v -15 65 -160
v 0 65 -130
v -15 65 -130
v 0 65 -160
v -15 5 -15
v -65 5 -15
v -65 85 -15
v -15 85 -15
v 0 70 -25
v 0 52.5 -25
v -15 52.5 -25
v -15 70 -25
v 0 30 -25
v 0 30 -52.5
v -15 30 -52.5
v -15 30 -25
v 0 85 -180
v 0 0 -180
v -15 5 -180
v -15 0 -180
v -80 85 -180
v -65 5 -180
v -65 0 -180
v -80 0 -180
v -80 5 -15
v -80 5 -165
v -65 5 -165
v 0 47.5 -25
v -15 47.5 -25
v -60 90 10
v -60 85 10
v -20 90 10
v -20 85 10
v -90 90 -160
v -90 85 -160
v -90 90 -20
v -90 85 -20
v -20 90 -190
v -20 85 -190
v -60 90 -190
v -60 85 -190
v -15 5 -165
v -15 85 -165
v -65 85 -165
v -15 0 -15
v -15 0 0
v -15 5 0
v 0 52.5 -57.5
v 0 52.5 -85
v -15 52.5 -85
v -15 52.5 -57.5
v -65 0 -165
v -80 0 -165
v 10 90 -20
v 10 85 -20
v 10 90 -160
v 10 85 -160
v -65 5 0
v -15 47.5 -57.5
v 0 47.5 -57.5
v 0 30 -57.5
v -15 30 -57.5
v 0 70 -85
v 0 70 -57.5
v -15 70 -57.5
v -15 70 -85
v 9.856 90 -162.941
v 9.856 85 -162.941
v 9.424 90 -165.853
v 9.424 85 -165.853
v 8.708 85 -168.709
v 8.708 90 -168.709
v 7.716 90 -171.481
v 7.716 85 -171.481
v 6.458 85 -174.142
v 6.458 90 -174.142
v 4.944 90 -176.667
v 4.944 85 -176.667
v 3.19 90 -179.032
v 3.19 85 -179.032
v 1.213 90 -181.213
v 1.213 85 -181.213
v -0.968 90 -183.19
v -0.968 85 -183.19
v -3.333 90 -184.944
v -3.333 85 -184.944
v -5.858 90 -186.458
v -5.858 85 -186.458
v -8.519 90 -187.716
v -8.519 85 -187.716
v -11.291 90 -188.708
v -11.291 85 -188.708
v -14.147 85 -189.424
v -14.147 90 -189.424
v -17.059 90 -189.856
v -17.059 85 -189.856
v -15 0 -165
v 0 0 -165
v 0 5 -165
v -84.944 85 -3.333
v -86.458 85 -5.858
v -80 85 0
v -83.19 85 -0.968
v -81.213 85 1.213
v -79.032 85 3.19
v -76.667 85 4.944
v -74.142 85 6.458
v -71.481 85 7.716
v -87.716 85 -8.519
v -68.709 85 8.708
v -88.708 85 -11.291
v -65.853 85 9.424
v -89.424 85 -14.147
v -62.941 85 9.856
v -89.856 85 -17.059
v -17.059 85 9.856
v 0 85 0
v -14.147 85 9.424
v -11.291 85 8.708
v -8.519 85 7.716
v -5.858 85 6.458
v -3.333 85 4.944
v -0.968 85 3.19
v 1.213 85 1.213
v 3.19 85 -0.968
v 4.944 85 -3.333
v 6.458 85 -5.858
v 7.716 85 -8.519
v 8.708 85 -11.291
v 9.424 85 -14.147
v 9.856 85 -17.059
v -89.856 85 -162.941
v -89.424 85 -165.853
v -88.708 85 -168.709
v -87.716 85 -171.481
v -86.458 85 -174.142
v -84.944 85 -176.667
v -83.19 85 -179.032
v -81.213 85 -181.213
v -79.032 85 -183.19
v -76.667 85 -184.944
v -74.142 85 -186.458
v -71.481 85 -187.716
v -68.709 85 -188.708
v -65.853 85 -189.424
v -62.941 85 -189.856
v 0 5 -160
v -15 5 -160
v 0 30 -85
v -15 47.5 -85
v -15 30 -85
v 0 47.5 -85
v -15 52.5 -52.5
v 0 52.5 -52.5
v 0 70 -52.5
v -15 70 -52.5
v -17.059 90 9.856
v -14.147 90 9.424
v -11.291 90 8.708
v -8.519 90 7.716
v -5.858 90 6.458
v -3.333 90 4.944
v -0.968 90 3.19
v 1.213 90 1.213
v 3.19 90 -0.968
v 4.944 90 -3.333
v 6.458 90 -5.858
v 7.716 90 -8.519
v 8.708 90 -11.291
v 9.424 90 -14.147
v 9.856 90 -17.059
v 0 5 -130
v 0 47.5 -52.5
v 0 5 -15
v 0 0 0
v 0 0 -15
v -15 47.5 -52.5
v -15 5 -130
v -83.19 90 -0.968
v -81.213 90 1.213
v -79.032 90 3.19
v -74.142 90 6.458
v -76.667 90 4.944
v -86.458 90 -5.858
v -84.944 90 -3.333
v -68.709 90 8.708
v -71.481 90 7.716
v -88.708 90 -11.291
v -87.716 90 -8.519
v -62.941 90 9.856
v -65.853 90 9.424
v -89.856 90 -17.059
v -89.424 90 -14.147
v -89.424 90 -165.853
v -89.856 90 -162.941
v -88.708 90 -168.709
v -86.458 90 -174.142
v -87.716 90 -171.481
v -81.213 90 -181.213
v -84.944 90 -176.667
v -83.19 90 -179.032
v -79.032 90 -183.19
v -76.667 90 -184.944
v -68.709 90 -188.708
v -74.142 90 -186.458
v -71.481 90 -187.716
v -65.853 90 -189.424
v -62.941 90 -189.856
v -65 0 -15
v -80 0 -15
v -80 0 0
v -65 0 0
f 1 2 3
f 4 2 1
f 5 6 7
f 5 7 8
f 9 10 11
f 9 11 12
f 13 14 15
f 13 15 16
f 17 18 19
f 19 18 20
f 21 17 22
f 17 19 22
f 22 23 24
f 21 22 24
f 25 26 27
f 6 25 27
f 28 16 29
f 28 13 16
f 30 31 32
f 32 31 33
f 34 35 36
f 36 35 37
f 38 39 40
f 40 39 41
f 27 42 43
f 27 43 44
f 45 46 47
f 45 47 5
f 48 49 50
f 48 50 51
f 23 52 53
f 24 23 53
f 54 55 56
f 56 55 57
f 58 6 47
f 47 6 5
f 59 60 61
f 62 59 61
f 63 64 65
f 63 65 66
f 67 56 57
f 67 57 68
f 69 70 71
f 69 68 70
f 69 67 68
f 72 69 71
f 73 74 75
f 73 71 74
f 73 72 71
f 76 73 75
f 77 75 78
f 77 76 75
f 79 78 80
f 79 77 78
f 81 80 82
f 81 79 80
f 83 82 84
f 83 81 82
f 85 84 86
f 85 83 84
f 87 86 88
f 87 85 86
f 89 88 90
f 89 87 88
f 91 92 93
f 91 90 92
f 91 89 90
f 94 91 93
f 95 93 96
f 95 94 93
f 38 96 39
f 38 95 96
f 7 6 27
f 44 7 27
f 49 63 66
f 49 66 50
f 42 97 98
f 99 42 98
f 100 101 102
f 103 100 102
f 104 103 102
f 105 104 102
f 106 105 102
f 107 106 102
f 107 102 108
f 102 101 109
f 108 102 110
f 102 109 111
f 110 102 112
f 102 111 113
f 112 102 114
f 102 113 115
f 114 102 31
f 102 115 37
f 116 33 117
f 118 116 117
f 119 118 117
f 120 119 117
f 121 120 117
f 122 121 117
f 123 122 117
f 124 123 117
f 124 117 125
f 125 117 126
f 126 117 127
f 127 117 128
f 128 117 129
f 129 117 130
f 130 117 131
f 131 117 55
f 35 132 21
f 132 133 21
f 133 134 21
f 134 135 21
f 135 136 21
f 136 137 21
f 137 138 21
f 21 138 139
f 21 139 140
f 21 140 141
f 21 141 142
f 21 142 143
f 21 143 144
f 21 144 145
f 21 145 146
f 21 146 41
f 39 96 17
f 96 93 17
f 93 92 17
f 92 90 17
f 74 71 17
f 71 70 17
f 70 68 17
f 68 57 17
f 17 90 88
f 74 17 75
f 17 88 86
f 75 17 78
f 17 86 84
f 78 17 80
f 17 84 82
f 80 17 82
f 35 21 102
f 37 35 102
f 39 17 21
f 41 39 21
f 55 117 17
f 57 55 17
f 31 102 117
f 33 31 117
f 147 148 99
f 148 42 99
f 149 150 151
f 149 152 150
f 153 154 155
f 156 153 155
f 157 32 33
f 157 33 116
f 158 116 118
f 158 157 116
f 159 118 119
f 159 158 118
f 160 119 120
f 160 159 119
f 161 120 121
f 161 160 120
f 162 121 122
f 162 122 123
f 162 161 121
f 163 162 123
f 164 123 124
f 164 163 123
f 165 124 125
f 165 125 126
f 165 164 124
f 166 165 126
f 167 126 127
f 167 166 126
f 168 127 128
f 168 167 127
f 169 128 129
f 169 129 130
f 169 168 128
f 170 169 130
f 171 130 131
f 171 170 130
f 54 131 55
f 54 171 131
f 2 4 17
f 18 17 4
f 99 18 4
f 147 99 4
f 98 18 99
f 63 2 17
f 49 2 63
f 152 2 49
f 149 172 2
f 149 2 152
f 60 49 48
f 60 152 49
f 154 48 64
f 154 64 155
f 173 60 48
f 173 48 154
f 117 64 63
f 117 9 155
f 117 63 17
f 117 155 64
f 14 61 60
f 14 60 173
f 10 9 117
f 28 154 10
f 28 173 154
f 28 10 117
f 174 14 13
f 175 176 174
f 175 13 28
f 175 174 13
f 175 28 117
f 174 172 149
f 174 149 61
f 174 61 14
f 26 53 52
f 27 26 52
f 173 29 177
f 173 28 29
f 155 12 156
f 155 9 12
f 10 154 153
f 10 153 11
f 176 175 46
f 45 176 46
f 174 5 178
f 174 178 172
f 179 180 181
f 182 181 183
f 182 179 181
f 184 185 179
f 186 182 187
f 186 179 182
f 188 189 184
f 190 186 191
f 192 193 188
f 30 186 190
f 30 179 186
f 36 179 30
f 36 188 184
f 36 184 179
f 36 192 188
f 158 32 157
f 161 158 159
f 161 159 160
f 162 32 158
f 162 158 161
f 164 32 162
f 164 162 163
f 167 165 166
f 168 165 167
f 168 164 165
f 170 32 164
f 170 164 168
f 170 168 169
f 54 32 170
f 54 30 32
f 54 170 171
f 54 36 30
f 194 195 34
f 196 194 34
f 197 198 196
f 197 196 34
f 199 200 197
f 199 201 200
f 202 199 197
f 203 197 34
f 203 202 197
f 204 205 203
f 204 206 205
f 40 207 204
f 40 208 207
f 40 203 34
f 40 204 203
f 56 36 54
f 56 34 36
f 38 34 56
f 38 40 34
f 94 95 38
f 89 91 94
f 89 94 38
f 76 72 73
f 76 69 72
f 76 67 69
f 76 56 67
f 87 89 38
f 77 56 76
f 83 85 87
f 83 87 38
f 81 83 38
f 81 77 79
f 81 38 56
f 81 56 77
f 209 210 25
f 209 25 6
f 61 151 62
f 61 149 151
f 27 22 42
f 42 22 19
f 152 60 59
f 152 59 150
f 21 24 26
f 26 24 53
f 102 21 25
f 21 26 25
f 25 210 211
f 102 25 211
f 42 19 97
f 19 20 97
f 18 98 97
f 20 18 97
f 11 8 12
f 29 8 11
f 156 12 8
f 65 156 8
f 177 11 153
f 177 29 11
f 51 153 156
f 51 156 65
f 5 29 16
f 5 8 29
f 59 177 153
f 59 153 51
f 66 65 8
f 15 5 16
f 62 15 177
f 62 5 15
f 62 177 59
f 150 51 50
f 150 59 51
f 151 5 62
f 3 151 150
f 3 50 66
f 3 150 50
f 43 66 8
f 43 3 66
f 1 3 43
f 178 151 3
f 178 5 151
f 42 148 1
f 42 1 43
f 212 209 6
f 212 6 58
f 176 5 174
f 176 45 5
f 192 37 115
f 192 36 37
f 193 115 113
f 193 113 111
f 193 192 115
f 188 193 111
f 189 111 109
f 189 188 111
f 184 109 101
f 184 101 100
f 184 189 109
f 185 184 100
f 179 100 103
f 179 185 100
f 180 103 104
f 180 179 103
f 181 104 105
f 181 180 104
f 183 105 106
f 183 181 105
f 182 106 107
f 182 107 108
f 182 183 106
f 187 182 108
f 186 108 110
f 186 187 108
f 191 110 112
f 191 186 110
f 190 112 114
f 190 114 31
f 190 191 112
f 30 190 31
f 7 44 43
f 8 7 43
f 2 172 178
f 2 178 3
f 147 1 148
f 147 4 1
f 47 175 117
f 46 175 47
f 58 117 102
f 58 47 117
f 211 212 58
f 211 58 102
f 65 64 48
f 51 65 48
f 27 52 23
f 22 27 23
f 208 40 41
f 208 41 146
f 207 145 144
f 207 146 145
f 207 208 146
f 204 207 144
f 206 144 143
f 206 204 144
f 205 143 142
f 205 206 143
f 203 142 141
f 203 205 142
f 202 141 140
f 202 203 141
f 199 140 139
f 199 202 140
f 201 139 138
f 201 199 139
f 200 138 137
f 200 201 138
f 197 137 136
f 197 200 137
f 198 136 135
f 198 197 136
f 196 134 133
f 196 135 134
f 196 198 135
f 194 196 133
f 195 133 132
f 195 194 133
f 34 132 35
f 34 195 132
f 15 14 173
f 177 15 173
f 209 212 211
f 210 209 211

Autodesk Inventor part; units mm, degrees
ref_plane "YZ Plane" through (0, 0, 0) normal (1, 0, 0) x (0, 1, 0)
ref_plane "XZ Plane" through (0, 0, 0) normal (0, 1, 0) x (-1, 0, 0)
ref_plane "XY Plane" through (0, 0, 0) normal (0, 0, 1) x (1, 0, 0)
sketch "Sketch1" plane through (0, 0, 0) normal (0, 1, 0) x (-1, 0, 0)
  line L0 (0, 0) -> (15, 0)
  line L1 (15, 0) -> (15, -15)
  line L2 (15, -15) -> (0, -15)
  line L3 (0, -15) -> (0, 0)
  line L4 (15, -165) -> (0, -165)
  line L5 (0, -165) -> (0, -180)
  line L6 (0, -180) -> (15, -180)
  line L7 (15, -180) -> (15, -165)
  line L8 (65, -180) -> (80, -180)
  line L9 (80, -180) -> (80, -165)
  line L10 (80, -165) -> (65, -165)
  line L11 (65, -165) -> (65, -180)
  line L12 (80, -15) -> (65, -15)
  line L13 (65, -15) -> (65, 0)
  line L14 (65, 0) -> (80, 0)
  line L15 (80, 0) -> (80, -15)
  point P0 (15, -7.5)
  dimension "d0" = 15
  dimension "d1" = 15
  dimension "d2" = 15
  dimension "d3" = 15
  dimension "d4" = 15
  dimension "d5" = 15
  dimension "d6" = 150
  dimension "d7" = 50
extrude "Extrusion1" add sketch "Sketch1" along normal blind 5
sketch "Sketch2" plane through (0, 5, 0) normal (0, 1, 0) x (1, 0, 0)
  line L0 (-80, 0) -> (-65, 0) projected
  line L1 (-80, 0) -> (-65, 0)
  line L2 (-65, 0) -> (-65, 180)
  line L3 (-65, 180) -> (-80, 180)
  line L4 (-80, 180) -> (-80, 0)
  line L5 (-15, 165) -> (0, 165) projected
  line L6 (-65, 180) -> (0, 180)
  line L7 (0, 180) -> (0, 165)
  line L8 (0, 165) -> (-65, 165)
  line L9 (-65, 165) -> (-65, 180)
  line L10 (-15, 0) -> (0, 0) projected
  line L11 (-15, 165) -> (0, 165)
  line L12 (0, 165) -> (0, 0)
  line L13 (0, 0) -> (-15, 0)
  line L14 (-15, 0) -> (-15, 165)
  line L15 (-15, 0) -> (-65, 0)
  line L16 (-65, 0) -> (-65, 15)
  line L17 (-65, 15) -> (-15, 15)
  line L18 (-15, 15) -> (-15, 0)
  point P0 (-65, 165)
extrude "Extrusion2" add sketch "Sketch2" along normal blind 80 contours L4 L3 L2 L0 | L2 L17 L14 L15 | L14 L5 L12 L10 | L6 L7 L5 L8 L2
sketch "Sketch3" plane through (0, 85, 0) normal (0, 1, 0) x (1, 0, 0)
  line L0 (-90, -10) -> (10, -10)
  line L1 (10, -10) -> (10, 190)
  line L2 (10, 190) -> (-90, 190)
  line L3 (-90, 190) -> (-90, -10)
  line L4 (-80, 180) -> (-80, 0) projected
  line L5 (0, 180) -> (-80, 180) projected
  line L6 (0, 0) -> (0, 180) projected
  line L7 (-80, 0) -> (0, 0) projected
  point P0 (-40, -10)
  dimension "d12" = 10
  dimension "d13" = 10
  dimension "d14" = 10
  dimension "d15" = 10
extrude "Extrusion3" add sketch "Sketch3" along normal blind 5 contours L3 L2 L1 L0 | L5 L6 L7 L4
fillet "Fillet1" radius 30 4 edges at (10, 87.5, 10) (-90, 87.5, 10) (-90, 87.5, -190) (10, 87.5, -190)
sketch "Sketch4" plane through (0, 0, 0) normal (1, 0, 0) x (0, 0, -1)
  line L0 (160, 5) -> (130, 5)
  line L1 (130, 5) -> (130, 65)
  line L2 (130, 65) -> (160, 65)
  line L3 (160, 65) -> (160, 5)
  line L4 (25, 70) -> (85, 70)
  line L5 (85, 70) -> (85, 30)
  line L6 (85, 30) -> (25, 30)
  line L7 (25, 30) -> (25, 70)
  line L8 (0, 0) -> (0, 85) projected
  line L9 (180, 0) -> (180, 85) projected
  line L10 (15, 5) -> (165, 5) projected
  line L11 (20, 85) -> (160, 85) projected
  line L12 (52.5, 70) -> (57.5, 70)
  line L13 (57.5, 70) -> (57.5, 30)
  line L14 (57.5, 30) -> (52.5, 30)
  line L15 (52.5, 30) -> (52.5, 70)
  line L16 (85, 52.5) -> (25, 52.5)
  line L17 (25, 52.5) -> (25, 47.5)
  line L18 (25, 47.5) -> (85, 47.5)
  line L19 (85, 47.5) -> (85, 52.5)
  point P0 (52.5, 52.5)
  point P1 (52.5, 47.5)
  point P2 (57.5, 47.5)
  point P3 (57.5, 52.5)
  dimension "d19" = 60
  dimension "d20" = 30
  dimension "d21" = 40
  dimension "d22" = 60
  dimension "d23" = 25
  dimension "d24" = 20
  dimension "d25" = 0
  dimension "d26" = 15
  dimension "d27" = 5
  dimension "d28" = 5
  dimension "d29" = 17.5
  dimension "d30" = 27.5
extrude "Extrusion4" cut sketch "Sketch4" against normal blind 15 contours L0 L1 L2 L3 | L4 L15 L16 L7 | L4 L5 L16 L13 | L18 L15 L6 L7 | L18 L5 L6 L13
properties part number "huis"
